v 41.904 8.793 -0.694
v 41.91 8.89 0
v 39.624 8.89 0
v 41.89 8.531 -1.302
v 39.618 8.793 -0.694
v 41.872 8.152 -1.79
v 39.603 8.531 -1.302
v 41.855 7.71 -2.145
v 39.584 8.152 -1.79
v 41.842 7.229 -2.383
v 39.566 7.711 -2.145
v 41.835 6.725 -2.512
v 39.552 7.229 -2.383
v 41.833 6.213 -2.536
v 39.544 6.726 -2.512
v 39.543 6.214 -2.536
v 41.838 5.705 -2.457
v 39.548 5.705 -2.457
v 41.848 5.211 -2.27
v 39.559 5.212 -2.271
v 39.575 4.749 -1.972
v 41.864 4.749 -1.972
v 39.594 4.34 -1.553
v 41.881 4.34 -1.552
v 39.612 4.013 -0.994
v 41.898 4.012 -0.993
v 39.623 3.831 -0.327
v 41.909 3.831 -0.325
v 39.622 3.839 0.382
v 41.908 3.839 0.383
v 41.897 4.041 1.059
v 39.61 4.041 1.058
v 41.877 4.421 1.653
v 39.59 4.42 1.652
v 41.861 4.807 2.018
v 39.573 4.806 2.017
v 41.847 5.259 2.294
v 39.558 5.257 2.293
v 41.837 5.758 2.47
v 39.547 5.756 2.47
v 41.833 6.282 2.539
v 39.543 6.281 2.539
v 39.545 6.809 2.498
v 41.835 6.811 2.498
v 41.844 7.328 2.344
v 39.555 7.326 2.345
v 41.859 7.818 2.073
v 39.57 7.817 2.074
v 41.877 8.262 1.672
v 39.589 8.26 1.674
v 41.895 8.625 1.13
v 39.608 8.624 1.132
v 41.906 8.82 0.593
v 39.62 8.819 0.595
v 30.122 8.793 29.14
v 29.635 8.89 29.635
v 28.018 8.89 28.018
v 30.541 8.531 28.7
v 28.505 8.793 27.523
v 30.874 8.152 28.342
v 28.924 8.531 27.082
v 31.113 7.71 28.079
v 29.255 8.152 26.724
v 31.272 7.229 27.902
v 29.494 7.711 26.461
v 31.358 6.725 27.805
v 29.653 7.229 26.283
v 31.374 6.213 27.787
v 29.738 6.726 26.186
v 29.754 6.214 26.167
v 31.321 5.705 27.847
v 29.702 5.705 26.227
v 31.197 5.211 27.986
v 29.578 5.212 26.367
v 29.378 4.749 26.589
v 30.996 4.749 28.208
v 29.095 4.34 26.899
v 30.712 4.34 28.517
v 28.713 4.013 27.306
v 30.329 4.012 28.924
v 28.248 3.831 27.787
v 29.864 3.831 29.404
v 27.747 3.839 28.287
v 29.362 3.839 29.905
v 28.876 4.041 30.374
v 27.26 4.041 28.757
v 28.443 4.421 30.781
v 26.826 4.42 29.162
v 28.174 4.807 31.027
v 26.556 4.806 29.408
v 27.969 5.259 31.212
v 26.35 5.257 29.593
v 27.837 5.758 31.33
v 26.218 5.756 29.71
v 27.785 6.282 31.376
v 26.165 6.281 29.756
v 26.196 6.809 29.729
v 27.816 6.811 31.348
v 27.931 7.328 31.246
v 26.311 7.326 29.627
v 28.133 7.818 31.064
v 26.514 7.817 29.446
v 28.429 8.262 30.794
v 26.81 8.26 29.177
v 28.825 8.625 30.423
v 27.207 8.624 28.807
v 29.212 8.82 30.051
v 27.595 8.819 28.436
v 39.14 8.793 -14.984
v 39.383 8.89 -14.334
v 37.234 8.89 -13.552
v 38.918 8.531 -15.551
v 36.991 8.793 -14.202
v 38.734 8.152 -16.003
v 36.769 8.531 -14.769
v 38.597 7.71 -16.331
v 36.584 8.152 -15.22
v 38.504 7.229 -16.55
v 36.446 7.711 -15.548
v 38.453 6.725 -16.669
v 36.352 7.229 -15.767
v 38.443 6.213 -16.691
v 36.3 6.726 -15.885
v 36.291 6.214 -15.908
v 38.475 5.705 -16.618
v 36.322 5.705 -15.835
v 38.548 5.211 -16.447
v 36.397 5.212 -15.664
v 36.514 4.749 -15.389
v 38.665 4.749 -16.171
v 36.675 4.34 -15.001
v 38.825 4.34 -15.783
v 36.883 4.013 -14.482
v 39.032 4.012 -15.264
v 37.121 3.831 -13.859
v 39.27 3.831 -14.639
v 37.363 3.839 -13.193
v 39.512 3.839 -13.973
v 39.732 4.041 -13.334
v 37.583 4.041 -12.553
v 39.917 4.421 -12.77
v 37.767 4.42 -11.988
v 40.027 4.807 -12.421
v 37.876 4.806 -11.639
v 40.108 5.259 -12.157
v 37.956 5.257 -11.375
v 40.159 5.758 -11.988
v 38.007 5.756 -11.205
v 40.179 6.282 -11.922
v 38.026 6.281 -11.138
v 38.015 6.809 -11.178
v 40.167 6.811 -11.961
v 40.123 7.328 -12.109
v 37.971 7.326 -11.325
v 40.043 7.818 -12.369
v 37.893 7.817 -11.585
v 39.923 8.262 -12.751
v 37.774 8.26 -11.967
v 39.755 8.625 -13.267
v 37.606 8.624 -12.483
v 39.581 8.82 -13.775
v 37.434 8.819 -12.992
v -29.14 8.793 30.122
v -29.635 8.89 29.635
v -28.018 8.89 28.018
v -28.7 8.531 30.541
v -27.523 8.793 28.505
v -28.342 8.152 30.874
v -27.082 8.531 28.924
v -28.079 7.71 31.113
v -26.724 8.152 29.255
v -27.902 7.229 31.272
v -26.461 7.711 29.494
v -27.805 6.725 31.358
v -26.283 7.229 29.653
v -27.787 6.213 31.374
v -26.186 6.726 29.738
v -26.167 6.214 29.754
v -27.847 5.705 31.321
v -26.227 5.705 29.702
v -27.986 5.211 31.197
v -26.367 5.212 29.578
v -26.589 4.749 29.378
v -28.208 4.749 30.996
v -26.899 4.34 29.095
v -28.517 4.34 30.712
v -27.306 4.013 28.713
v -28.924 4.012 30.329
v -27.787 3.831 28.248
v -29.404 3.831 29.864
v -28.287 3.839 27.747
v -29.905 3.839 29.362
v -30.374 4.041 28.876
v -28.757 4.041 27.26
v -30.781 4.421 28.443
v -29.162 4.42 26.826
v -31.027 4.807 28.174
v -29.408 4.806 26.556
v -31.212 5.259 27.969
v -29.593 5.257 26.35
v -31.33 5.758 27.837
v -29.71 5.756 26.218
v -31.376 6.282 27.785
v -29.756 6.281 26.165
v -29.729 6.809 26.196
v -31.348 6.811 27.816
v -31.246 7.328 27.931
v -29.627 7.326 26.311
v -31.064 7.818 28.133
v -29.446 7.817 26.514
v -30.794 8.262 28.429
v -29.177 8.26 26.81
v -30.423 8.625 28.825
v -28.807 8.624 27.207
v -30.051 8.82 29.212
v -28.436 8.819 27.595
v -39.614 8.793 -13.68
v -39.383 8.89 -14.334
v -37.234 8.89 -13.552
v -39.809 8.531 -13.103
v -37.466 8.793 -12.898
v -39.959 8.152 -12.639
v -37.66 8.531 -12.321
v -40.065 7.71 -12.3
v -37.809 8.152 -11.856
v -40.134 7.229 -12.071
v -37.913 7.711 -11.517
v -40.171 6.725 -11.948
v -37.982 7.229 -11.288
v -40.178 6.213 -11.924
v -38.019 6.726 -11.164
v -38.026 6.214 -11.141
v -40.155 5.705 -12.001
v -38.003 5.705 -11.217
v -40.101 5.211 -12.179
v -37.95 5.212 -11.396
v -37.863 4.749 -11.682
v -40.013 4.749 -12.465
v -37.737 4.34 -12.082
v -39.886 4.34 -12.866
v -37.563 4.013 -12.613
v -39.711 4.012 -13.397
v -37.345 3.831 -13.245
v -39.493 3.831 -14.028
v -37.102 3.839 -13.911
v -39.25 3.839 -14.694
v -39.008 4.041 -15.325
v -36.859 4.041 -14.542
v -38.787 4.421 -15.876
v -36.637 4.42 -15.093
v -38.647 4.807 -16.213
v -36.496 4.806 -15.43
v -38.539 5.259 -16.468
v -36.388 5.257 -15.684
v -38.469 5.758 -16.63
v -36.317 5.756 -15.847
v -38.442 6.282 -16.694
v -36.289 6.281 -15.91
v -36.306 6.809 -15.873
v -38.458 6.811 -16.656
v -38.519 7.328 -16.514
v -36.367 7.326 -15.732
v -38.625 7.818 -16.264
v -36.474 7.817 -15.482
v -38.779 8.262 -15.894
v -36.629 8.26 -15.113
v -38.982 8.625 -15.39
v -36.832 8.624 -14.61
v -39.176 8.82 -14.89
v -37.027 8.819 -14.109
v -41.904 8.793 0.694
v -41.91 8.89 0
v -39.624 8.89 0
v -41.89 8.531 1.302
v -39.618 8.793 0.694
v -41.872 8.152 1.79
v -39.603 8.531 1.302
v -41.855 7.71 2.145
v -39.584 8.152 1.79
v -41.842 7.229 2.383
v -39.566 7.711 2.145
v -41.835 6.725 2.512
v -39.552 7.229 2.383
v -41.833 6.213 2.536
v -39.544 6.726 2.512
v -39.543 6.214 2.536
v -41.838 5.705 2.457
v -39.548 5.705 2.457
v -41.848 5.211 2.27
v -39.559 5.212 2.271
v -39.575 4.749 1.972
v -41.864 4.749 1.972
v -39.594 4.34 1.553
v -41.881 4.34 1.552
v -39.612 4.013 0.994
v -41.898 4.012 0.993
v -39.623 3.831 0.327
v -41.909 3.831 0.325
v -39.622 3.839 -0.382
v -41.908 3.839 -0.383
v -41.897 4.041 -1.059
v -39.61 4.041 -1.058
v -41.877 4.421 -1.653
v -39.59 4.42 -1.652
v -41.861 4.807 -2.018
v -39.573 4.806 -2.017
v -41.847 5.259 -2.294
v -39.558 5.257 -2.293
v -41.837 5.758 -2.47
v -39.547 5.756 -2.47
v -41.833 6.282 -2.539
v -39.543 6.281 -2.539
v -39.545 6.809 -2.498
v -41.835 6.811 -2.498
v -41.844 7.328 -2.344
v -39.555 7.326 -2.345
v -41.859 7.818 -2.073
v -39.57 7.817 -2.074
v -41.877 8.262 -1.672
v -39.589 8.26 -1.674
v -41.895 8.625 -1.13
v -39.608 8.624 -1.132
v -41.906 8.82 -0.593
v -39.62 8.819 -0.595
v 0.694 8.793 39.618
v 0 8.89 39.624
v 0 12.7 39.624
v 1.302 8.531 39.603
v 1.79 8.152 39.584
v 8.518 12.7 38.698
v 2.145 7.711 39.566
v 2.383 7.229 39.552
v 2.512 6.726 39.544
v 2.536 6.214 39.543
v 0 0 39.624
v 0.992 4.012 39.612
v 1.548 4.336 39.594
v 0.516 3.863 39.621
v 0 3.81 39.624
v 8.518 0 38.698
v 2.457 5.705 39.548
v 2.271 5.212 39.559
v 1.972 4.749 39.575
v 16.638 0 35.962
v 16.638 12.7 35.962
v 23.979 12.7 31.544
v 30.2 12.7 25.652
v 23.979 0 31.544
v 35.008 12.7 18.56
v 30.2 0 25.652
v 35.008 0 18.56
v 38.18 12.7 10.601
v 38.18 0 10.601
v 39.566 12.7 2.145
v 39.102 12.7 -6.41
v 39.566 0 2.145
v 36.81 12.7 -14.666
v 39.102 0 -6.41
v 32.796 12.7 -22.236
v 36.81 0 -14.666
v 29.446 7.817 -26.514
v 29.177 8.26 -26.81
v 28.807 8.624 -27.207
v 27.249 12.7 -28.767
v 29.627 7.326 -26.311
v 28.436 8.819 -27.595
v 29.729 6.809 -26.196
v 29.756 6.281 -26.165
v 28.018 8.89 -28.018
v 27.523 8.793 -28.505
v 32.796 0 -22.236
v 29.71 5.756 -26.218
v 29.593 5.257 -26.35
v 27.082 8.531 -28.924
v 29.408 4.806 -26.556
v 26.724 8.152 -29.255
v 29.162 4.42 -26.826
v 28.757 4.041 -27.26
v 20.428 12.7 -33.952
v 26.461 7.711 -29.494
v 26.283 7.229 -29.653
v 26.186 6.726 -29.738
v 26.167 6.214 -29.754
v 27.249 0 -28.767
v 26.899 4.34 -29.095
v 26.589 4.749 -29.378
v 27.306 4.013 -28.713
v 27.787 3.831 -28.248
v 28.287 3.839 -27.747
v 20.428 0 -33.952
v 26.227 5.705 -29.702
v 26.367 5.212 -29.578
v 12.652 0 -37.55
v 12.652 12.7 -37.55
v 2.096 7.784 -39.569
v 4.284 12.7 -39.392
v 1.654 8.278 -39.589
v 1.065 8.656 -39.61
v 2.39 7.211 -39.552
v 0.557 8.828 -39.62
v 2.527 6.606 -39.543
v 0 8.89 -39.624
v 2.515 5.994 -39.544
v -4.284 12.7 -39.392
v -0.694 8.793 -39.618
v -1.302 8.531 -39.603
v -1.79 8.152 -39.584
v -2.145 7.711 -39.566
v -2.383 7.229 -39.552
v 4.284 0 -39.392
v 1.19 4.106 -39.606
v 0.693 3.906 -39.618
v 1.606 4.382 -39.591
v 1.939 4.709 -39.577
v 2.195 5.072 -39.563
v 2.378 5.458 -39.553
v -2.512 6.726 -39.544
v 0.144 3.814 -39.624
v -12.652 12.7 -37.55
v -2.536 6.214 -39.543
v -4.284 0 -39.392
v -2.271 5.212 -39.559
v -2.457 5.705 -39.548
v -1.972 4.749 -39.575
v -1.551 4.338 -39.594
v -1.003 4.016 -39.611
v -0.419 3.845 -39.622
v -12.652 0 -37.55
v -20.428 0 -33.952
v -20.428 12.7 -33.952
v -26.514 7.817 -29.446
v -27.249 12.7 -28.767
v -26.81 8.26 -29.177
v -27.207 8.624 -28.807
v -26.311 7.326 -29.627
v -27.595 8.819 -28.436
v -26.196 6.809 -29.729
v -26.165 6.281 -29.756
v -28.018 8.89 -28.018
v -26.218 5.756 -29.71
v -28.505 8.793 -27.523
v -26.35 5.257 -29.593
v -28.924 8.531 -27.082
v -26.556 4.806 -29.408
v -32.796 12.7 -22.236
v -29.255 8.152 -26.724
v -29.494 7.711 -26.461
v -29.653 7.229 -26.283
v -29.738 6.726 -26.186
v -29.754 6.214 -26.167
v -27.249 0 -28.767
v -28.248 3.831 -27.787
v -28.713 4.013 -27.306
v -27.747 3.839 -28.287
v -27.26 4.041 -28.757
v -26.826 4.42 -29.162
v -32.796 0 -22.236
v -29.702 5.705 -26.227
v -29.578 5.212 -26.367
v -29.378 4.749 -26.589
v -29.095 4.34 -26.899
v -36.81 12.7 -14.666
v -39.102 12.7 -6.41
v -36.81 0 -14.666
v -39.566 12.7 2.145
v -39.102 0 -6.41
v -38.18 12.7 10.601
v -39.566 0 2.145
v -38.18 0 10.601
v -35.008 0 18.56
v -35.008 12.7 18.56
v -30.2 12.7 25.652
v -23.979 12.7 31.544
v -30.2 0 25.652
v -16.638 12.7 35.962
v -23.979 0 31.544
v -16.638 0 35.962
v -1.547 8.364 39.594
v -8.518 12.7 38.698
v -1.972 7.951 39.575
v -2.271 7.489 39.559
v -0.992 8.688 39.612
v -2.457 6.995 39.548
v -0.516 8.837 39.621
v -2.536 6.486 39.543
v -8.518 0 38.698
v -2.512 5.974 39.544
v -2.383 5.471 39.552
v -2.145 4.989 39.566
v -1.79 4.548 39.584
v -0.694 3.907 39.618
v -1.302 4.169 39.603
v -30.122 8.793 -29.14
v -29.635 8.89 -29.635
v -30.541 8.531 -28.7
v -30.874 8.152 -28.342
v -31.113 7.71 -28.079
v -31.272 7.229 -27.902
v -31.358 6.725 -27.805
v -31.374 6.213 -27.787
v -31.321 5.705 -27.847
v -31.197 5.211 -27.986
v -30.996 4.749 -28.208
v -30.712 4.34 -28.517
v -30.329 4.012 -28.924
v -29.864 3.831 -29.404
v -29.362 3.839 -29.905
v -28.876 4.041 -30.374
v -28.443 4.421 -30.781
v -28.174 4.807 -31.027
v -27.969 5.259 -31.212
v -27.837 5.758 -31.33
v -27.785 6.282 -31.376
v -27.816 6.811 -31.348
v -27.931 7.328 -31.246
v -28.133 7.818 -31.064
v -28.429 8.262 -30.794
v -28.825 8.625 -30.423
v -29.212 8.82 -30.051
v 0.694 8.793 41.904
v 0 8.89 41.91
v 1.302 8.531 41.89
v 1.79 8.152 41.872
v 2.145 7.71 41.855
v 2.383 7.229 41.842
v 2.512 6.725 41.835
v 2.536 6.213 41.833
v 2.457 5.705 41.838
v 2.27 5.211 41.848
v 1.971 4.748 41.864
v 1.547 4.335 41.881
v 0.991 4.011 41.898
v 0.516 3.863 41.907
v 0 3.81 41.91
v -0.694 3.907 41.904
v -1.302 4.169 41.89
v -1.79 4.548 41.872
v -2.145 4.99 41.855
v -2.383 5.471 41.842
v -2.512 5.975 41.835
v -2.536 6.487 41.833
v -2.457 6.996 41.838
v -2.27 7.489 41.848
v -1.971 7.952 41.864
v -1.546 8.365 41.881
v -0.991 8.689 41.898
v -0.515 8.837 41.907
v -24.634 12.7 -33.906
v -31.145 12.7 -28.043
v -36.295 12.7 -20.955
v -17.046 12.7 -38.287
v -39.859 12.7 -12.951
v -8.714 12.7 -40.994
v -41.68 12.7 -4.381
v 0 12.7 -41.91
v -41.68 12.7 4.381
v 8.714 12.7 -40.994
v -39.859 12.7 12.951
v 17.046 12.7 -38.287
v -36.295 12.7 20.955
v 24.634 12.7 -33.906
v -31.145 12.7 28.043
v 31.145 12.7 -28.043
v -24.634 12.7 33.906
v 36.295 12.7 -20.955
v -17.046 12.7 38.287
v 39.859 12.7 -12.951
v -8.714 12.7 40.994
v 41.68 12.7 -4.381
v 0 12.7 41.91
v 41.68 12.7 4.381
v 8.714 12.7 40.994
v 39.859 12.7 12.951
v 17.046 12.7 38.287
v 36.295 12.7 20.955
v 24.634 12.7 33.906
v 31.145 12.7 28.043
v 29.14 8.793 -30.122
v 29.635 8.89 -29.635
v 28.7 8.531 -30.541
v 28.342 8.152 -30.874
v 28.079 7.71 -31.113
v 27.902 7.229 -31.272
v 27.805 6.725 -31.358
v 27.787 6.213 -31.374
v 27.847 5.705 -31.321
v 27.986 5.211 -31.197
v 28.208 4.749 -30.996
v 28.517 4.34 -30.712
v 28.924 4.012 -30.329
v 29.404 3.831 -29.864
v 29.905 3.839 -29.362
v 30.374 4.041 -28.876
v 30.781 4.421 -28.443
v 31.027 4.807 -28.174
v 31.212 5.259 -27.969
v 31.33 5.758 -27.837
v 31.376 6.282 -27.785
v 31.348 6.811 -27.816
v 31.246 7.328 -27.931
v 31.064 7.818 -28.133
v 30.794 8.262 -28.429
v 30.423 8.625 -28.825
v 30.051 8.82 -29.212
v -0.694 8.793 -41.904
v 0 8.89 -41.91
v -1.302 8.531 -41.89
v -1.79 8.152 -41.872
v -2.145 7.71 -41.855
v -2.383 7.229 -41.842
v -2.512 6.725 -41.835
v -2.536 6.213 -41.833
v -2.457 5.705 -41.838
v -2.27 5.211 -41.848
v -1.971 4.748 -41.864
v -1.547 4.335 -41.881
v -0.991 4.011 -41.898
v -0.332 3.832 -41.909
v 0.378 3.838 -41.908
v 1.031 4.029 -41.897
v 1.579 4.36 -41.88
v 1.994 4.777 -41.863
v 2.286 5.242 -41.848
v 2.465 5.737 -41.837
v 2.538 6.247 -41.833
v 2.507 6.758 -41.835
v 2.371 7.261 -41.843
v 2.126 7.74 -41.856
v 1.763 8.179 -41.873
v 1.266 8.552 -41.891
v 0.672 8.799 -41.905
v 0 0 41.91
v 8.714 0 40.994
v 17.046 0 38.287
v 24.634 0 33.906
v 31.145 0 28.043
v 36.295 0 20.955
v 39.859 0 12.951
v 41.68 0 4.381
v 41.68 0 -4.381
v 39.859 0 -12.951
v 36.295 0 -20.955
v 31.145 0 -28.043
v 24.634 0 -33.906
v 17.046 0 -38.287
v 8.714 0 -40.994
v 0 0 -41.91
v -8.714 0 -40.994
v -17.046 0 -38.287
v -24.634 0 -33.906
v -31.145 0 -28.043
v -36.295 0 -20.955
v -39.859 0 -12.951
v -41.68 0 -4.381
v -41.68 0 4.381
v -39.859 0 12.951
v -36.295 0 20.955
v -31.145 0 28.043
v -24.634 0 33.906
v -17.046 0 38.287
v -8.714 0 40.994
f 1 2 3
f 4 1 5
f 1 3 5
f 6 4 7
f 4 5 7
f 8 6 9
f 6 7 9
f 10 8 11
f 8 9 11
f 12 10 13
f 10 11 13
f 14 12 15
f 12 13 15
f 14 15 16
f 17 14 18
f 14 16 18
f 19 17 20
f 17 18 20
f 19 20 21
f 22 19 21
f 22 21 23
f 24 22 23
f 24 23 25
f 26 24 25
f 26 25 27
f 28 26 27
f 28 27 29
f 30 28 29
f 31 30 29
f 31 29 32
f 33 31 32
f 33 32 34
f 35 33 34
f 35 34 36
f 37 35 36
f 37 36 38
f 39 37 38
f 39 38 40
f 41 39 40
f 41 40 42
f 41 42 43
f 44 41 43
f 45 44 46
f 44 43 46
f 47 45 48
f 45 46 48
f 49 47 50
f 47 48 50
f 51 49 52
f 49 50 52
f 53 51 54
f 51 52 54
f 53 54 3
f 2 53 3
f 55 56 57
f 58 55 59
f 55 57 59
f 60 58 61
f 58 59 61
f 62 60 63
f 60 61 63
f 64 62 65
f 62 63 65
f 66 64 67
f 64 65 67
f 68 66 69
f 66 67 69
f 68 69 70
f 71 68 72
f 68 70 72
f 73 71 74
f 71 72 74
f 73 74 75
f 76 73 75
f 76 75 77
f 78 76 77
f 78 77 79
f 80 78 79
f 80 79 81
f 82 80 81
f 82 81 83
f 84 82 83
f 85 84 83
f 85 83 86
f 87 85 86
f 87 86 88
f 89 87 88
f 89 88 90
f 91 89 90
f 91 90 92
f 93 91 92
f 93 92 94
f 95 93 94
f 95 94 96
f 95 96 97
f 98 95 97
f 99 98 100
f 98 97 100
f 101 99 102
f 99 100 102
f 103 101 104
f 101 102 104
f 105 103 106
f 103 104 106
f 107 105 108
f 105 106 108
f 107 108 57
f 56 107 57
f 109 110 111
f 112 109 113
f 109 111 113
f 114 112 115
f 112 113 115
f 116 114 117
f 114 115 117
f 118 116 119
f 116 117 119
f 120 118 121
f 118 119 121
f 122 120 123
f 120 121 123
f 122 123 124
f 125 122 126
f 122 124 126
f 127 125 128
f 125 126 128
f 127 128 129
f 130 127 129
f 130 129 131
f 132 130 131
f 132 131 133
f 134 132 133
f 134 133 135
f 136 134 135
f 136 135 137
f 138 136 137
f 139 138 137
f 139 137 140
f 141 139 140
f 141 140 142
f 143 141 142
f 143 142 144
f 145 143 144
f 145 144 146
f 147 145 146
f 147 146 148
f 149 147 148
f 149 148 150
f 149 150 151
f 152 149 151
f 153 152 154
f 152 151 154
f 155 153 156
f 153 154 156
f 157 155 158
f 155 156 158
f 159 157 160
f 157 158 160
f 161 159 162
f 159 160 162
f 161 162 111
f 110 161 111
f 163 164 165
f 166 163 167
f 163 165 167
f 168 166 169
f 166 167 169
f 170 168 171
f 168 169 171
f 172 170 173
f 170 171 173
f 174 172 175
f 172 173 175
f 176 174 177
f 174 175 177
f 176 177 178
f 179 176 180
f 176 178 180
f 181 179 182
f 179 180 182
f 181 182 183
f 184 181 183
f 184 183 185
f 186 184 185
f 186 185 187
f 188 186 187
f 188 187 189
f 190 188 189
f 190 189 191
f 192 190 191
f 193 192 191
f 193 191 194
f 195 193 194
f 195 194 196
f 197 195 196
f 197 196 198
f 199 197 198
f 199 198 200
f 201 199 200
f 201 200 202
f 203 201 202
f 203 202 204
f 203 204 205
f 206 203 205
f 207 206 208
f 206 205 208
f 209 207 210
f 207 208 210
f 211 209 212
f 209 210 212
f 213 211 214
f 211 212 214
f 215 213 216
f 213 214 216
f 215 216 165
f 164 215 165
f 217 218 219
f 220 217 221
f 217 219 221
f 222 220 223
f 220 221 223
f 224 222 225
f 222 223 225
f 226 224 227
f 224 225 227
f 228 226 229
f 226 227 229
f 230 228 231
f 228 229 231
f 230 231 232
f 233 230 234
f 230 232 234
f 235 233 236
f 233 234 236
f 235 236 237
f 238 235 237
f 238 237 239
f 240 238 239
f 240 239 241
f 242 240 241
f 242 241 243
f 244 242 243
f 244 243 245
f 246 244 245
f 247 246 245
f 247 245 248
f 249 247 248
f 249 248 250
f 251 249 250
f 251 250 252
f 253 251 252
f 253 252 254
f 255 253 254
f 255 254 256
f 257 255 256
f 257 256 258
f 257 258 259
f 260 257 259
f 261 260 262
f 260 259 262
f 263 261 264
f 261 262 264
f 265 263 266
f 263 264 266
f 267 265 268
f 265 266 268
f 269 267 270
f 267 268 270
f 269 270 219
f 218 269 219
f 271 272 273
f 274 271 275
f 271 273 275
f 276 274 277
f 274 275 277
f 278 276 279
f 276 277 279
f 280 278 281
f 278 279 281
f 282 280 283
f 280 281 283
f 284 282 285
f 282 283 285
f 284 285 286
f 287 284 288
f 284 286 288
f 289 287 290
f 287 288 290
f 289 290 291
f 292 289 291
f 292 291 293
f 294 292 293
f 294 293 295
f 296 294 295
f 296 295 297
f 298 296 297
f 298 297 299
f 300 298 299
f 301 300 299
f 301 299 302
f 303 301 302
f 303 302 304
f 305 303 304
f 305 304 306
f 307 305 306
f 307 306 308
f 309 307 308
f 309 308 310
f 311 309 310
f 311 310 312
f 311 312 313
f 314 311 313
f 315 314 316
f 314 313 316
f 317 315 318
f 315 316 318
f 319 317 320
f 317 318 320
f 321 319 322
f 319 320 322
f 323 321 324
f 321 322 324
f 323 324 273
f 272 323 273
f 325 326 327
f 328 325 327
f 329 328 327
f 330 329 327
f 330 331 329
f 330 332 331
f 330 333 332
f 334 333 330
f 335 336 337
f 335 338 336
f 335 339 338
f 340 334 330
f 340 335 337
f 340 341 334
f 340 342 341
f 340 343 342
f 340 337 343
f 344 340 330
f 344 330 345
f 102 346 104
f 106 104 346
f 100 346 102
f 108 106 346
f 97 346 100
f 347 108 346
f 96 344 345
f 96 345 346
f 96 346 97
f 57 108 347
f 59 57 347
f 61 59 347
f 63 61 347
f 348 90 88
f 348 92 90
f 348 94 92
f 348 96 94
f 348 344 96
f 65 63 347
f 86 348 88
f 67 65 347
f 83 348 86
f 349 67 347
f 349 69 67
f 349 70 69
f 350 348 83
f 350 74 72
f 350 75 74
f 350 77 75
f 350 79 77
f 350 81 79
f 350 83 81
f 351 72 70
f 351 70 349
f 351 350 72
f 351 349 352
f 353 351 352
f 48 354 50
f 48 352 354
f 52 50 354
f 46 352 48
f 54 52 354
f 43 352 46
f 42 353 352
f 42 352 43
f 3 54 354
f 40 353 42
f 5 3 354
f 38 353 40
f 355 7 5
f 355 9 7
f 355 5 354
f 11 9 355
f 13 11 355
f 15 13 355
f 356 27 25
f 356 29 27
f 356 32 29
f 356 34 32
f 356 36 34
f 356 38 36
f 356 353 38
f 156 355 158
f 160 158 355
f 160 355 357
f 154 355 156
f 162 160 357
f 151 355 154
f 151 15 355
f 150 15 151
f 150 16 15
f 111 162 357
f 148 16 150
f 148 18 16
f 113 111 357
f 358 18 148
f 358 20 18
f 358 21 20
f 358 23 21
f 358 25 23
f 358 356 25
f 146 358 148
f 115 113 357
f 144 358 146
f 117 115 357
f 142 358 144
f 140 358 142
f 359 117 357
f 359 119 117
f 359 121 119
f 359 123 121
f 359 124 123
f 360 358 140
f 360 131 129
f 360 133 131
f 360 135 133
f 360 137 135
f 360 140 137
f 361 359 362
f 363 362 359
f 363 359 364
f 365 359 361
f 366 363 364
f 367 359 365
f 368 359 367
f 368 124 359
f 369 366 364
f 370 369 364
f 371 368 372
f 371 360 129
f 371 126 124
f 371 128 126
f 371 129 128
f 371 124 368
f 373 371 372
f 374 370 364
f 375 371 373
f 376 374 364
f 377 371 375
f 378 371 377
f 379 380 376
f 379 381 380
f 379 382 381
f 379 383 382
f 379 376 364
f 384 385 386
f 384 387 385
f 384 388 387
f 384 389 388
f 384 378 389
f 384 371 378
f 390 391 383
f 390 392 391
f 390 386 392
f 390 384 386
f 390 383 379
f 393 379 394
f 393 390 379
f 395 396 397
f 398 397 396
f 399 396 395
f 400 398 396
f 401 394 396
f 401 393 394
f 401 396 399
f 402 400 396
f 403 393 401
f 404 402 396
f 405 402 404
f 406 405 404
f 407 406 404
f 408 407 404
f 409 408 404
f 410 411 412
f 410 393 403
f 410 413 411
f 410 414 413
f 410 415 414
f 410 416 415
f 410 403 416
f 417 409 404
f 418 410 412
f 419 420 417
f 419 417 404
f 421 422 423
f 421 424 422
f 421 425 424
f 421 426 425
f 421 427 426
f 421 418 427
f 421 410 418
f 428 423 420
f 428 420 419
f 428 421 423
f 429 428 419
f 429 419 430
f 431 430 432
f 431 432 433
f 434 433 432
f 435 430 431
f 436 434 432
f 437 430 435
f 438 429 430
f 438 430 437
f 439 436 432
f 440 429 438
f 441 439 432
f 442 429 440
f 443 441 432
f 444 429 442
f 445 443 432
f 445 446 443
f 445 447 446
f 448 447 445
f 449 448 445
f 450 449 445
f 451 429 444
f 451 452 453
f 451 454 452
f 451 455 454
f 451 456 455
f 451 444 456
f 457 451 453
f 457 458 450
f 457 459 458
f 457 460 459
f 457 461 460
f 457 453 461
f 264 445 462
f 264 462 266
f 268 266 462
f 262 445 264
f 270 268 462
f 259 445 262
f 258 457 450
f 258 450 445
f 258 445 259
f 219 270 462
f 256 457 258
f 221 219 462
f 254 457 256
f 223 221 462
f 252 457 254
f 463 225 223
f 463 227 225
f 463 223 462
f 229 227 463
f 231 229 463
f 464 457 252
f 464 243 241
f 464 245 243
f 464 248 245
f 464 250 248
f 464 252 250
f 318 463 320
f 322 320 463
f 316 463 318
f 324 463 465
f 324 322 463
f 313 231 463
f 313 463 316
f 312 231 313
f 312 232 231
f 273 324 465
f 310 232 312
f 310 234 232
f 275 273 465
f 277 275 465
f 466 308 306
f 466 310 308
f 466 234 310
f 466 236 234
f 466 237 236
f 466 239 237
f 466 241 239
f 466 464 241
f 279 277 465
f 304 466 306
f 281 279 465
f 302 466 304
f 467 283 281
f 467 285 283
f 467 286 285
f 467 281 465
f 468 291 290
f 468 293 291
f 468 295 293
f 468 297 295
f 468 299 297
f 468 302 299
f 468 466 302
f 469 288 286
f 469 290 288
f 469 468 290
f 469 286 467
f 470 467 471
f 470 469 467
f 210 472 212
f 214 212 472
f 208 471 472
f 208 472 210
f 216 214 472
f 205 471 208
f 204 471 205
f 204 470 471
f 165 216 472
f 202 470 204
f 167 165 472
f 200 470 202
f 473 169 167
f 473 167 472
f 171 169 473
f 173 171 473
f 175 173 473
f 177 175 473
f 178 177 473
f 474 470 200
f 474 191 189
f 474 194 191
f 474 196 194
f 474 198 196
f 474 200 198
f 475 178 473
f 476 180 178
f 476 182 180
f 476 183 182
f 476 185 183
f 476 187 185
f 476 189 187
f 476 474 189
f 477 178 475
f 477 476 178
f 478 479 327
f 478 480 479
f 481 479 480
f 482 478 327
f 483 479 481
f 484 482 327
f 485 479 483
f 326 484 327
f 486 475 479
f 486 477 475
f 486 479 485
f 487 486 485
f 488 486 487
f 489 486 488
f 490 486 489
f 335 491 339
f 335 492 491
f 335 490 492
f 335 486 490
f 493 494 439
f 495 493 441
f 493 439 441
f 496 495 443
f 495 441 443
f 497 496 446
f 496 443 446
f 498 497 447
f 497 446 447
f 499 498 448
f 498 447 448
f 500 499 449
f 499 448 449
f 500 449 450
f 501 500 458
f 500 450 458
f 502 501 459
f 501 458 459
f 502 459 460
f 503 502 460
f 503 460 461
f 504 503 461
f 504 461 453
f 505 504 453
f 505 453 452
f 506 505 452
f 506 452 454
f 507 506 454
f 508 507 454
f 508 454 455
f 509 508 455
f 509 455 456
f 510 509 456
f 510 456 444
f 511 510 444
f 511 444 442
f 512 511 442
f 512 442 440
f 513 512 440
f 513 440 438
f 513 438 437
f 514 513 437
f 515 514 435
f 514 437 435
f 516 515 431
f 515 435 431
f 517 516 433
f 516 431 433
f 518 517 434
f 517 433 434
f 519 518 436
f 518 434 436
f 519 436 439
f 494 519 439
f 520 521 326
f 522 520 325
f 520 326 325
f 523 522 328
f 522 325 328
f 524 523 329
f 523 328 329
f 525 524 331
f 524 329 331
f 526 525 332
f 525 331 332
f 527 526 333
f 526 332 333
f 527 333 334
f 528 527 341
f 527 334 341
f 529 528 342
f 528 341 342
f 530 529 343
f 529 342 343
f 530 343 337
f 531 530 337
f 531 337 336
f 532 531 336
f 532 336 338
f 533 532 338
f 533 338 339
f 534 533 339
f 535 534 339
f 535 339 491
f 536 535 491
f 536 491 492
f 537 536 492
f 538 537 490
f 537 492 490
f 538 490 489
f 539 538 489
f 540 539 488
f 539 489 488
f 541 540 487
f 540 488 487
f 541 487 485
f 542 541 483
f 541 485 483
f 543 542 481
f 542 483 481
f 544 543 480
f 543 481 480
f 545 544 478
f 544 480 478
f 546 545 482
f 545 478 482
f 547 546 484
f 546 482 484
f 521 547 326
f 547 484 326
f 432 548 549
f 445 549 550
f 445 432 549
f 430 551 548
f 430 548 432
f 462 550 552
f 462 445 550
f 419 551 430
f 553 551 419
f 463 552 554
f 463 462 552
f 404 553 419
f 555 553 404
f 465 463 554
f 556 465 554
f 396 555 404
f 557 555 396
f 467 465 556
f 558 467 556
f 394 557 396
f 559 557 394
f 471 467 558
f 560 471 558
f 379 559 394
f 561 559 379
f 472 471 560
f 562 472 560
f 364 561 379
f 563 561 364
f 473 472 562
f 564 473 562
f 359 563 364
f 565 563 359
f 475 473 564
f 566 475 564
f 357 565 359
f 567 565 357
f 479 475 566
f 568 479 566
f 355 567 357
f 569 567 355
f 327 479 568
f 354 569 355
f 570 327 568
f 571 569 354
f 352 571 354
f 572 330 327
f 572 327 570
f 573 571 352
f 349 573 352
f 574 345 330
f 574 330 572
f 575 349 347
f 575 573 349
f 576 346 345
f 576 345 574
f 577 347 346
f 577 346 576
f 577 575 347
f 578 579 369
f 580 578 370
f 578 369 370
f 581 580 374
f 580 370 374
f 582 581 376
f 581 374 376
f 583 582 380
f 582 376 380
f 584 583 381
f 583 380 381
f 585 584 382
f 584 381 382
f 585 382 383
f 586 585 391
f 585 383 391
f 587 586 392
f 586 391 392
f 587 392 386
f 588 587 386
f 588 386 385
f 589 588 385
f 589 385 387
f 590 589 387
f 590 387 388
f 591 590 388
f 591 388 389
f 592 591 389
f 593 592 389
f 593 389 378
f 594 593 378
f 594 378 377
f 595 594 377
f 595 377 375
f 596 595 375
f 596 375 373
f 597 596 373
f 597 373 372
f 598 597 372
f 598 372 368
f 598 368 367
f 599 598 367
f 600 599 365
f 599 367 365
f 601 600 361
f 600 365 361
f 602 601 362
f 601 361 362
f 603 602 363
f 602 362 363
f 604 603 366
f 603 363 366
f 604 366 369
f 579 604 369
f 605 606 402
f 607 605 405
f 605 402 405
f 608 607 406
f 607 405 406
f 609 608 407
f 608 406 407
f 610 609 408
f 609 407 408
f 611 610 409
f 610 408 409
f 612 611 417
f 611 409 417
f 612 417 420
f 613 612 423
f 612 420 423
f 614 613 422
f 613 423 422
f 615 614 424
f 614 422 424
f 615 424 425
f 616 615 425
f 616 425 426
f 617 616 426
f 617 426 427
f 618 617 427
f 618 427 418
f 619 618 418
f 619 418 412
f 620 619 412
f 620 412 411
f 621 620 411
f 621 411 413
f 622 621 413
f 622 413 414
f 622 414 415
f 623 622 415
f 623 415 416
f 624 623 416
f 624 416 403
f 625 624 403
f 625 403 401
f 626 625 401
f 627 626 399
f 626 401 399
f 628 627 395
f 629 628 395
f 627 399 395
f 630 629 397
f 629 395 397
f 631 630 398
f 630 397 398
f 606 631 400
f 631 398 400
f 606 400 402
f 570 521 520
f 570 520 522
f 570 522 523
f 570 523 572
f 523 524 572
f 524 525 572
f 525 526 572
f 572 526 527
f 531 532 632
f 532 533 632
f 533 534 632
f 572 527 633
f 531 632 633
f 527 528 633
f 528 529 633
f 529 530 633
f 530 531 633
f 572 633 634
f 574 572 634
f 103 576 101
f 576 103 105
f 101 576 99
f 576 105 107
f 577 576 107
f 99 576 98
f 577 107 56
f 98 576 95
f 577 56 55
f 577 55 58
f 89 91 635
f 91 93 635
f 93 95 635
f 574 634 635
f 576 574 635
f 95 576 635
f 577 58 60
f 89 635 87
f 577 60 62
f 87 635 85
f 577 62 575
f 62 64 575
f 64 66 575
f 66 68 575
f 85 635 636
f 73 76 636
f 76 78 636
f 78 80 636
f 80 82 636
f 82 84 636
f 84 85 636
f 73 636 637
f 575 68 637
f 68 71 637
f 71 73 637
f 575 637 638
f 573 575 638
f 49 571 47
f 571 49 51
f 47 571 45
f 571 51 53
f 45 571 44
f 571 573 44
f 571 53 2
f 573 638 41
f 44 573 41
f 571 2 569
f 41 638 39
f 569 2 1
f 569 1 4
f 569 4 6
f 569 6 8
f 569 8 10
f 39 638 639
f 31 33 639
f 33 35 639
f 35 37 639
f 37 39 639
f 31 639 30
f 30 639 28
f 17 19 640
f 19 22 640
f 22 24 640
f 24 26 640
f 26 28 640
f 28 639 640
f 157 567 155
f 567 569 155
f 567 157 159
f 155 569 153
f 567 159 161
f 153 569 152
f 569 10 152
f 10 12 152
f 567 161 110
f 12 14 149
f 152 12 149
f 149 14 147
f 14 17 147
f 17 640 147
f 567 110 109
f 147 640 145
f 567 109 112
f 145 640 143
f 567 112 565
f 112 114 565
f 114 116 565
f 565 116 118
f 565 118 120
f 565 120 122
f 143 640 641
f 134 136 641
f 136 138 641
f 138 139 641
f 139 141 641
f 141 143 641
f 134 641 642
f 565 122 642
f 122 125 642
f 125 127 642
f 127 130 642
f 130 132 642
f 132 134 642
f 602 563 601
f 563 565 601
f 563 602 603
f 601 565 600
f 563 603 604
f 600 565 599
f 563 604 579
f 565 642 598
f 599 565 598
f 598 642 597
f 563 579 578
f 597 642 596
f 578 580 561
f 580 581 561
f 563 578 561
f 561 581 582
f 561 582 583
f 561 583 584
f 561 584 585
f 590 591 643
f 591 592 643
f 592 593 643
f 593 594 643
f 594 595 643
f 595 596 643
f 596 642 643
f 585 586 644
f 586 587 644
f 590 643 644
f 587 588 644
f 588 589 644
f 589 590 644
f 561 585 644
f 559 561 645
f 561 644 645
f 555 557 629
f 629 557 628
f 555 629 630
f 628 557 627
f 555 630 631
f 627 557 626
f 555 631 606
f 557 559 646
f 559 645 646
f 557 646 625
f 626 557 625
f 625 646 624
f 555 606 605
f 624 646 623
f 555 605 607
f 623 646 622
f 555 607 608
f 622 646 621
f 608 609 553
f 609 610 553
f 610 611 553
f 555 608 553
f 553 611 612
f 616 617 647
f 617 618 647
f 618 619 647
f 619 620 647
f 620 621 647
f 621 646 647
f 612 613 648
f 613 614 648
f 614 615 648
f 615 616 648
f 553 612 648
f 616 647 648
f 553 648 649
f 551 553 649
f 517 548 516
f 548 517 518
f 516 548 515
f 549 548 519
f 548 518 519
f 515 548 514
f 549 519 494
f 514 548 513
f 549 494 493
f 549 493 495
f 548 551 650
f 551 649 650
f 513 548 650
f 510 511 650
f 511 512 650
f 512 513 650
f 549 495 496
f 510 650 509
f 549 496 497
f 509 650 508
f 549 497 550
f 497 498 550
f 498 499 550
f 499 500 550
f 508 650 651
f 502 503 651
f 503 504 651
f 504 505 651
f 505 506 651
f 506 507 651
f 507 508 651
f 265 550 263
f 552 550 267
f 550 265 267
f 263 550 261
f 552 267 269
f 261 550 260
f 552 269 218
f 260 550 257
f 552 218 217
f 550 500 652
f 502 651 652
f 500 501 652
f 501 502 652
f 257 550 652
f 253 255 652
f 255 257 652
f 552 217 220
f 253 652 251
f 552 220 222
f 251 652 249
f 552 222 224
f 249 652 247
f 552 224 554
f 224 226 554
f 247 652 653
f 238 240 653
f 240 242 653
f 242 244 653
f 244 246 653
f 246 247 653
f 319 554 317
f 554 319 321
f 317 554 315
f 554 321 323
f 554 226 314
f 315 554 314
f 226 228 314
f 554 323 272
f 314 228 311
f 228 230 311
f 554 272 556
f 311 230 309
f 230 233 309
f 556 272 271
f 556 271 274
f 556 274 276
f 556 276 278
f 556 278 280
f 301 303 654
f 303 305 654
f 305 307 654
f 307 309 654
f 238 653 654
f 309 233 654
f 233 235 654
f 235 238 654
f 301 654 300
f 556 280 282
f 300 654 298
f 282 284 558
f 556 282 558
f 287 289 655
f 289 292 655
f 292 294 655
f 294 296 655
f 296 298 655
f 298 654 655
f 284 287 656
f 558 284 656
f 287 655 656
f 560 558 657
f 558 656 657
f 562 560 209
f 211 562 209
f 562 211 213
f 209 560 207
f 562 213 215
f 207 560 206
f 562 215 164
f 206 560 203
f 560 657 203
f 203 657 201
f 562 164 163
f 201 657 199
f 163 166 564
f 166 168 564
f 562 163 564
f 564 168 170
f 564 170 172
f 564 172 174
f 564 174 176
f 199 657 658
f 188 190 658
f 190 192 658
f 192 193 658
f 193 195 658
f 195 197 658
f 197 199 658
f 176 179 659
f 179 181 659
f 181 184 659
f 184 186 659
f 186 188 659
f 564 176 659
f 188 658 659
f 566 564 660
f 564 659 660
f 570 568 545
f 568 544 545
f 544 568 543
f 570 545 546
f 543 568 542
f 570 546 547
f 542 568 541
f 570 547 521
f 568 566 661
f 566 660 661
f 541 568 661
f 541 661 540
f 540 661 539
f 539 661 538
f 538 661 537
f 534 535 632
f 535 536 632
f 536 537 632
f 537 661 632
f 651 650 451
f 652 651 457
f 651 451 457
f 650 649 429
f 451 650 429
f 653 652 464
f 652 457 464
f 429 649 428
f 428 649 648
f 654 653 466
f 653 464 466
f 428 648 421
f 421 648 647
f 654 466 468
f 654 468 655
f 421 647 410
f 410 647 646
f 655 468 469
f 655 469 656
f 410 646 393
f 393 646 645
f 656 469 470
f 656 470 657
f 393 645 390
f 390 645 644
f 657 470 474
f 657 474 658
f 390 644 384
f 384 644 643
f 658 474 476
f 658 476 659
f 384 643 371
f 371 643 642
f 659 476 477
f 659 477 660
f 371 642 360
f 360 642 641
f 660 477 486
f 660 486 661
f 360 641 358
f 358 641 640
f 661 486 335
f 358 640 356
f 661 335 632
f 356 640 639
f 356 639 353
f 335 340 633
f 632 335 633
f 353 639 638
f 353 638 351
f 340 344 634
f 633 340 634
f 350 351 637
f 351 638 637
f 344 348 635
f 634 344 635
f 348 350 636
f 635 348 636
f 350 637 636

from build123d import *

# Parameters (mm, degrees)
SKETCH1_R                       = 41.91
SKETCH1_R_2                     = 39.624
BOSS_EXTRUDE2_DEPTH             = 12.7
SKETCH2_R                       = 2.54
CUT_EXTRUDE1_DEPTH              = 56.7
CIRPATTERN1_COUNT               = 8
CIRPATTERN2_COUNT               = 2
CIRPATTERN2_ANGLE               = 70
CIRPATTERN2_THE_OTHER_WAY_COUNT = 2
CIRPATTERN2_THE_OTHER_WAY_ANGLE = 70


with BuildPart() as part:
    # Sketch1 → Boss-Extrude2 (new body)
    with BuildSketch(Plane(origin=(0, 0, 0), x_dir=(1, 0, 0), z_dir=(0, 1, 0))):
        with Locations(Location((0, 0, 0), (0, 0, 270))):
            Circle(SKETCH1_R)
        with Locations(Location((0, 0, 0), (0, 0, 270))):
            Circle(SKETCH1_R_2, mode=Mode.SUBTRACT)
    extrude(amount=BOSS_EXTRUDE2_DEPTH)

    # Sketch2 → Cut-Extrude1 (cut)
    with BuildSketch(Plane.XY):
        with Locations(Location((0, 6.35, 0), (0, 0, 90))):
            Circle(SKETCH2_R)
    cut_extrude1 = extrude(amount=-CUT_EXTRUDE1_DEPTH, mode=Mode.SUBTRACT)

    # CirPattern1: Cut-Extrude1 ×8 about axis
    cirpattern1_axis = Axis((0, 12.7, 0), (0, 1, 0))
    for i in range(1, CIRPATTERN1_COUNT):
        add(cut_extrude1.rotate(cirpattern1_axis, i * 360 / CIRPATTERN1_COUNT), mode=Mode.SUBTRACT)

    # CirPattern2: Cut-Extrude1 ×2 about axis
    cirpattern2_axis = Axis((0, 12.7, 0), (0, 1, 0))
    for i in range(1, CIRPATTERN2_COUNT):
        add(cut_extrude1.rotate(cirpattern2_axis, i * CIRPATTERN2_ANGLE / (CIRPATTERN2_COUNT - 1)), mode=Mode.SUBTRACT)

    # CirPattern2 the other way: Cut-Extrude1 ×2 about axis
    cirpattern2_the_other_way_axis = Axis((0, 12.7, 0), (0, -1, 0))
    for i in range(1, CIRPATTERN2_THE_OTHER_WAY_COUNT):
        add(cut_extrude1.rotate(cirpattern2_the_other_way_axis, i * CIRPATTERN2_THE_OTHER_WAY_ANGLE / (CIRPATTERN2_THE_OTHER_WAY_COUNT - 1)), mode=Mode.SUBTRACT)


solid = part.part
